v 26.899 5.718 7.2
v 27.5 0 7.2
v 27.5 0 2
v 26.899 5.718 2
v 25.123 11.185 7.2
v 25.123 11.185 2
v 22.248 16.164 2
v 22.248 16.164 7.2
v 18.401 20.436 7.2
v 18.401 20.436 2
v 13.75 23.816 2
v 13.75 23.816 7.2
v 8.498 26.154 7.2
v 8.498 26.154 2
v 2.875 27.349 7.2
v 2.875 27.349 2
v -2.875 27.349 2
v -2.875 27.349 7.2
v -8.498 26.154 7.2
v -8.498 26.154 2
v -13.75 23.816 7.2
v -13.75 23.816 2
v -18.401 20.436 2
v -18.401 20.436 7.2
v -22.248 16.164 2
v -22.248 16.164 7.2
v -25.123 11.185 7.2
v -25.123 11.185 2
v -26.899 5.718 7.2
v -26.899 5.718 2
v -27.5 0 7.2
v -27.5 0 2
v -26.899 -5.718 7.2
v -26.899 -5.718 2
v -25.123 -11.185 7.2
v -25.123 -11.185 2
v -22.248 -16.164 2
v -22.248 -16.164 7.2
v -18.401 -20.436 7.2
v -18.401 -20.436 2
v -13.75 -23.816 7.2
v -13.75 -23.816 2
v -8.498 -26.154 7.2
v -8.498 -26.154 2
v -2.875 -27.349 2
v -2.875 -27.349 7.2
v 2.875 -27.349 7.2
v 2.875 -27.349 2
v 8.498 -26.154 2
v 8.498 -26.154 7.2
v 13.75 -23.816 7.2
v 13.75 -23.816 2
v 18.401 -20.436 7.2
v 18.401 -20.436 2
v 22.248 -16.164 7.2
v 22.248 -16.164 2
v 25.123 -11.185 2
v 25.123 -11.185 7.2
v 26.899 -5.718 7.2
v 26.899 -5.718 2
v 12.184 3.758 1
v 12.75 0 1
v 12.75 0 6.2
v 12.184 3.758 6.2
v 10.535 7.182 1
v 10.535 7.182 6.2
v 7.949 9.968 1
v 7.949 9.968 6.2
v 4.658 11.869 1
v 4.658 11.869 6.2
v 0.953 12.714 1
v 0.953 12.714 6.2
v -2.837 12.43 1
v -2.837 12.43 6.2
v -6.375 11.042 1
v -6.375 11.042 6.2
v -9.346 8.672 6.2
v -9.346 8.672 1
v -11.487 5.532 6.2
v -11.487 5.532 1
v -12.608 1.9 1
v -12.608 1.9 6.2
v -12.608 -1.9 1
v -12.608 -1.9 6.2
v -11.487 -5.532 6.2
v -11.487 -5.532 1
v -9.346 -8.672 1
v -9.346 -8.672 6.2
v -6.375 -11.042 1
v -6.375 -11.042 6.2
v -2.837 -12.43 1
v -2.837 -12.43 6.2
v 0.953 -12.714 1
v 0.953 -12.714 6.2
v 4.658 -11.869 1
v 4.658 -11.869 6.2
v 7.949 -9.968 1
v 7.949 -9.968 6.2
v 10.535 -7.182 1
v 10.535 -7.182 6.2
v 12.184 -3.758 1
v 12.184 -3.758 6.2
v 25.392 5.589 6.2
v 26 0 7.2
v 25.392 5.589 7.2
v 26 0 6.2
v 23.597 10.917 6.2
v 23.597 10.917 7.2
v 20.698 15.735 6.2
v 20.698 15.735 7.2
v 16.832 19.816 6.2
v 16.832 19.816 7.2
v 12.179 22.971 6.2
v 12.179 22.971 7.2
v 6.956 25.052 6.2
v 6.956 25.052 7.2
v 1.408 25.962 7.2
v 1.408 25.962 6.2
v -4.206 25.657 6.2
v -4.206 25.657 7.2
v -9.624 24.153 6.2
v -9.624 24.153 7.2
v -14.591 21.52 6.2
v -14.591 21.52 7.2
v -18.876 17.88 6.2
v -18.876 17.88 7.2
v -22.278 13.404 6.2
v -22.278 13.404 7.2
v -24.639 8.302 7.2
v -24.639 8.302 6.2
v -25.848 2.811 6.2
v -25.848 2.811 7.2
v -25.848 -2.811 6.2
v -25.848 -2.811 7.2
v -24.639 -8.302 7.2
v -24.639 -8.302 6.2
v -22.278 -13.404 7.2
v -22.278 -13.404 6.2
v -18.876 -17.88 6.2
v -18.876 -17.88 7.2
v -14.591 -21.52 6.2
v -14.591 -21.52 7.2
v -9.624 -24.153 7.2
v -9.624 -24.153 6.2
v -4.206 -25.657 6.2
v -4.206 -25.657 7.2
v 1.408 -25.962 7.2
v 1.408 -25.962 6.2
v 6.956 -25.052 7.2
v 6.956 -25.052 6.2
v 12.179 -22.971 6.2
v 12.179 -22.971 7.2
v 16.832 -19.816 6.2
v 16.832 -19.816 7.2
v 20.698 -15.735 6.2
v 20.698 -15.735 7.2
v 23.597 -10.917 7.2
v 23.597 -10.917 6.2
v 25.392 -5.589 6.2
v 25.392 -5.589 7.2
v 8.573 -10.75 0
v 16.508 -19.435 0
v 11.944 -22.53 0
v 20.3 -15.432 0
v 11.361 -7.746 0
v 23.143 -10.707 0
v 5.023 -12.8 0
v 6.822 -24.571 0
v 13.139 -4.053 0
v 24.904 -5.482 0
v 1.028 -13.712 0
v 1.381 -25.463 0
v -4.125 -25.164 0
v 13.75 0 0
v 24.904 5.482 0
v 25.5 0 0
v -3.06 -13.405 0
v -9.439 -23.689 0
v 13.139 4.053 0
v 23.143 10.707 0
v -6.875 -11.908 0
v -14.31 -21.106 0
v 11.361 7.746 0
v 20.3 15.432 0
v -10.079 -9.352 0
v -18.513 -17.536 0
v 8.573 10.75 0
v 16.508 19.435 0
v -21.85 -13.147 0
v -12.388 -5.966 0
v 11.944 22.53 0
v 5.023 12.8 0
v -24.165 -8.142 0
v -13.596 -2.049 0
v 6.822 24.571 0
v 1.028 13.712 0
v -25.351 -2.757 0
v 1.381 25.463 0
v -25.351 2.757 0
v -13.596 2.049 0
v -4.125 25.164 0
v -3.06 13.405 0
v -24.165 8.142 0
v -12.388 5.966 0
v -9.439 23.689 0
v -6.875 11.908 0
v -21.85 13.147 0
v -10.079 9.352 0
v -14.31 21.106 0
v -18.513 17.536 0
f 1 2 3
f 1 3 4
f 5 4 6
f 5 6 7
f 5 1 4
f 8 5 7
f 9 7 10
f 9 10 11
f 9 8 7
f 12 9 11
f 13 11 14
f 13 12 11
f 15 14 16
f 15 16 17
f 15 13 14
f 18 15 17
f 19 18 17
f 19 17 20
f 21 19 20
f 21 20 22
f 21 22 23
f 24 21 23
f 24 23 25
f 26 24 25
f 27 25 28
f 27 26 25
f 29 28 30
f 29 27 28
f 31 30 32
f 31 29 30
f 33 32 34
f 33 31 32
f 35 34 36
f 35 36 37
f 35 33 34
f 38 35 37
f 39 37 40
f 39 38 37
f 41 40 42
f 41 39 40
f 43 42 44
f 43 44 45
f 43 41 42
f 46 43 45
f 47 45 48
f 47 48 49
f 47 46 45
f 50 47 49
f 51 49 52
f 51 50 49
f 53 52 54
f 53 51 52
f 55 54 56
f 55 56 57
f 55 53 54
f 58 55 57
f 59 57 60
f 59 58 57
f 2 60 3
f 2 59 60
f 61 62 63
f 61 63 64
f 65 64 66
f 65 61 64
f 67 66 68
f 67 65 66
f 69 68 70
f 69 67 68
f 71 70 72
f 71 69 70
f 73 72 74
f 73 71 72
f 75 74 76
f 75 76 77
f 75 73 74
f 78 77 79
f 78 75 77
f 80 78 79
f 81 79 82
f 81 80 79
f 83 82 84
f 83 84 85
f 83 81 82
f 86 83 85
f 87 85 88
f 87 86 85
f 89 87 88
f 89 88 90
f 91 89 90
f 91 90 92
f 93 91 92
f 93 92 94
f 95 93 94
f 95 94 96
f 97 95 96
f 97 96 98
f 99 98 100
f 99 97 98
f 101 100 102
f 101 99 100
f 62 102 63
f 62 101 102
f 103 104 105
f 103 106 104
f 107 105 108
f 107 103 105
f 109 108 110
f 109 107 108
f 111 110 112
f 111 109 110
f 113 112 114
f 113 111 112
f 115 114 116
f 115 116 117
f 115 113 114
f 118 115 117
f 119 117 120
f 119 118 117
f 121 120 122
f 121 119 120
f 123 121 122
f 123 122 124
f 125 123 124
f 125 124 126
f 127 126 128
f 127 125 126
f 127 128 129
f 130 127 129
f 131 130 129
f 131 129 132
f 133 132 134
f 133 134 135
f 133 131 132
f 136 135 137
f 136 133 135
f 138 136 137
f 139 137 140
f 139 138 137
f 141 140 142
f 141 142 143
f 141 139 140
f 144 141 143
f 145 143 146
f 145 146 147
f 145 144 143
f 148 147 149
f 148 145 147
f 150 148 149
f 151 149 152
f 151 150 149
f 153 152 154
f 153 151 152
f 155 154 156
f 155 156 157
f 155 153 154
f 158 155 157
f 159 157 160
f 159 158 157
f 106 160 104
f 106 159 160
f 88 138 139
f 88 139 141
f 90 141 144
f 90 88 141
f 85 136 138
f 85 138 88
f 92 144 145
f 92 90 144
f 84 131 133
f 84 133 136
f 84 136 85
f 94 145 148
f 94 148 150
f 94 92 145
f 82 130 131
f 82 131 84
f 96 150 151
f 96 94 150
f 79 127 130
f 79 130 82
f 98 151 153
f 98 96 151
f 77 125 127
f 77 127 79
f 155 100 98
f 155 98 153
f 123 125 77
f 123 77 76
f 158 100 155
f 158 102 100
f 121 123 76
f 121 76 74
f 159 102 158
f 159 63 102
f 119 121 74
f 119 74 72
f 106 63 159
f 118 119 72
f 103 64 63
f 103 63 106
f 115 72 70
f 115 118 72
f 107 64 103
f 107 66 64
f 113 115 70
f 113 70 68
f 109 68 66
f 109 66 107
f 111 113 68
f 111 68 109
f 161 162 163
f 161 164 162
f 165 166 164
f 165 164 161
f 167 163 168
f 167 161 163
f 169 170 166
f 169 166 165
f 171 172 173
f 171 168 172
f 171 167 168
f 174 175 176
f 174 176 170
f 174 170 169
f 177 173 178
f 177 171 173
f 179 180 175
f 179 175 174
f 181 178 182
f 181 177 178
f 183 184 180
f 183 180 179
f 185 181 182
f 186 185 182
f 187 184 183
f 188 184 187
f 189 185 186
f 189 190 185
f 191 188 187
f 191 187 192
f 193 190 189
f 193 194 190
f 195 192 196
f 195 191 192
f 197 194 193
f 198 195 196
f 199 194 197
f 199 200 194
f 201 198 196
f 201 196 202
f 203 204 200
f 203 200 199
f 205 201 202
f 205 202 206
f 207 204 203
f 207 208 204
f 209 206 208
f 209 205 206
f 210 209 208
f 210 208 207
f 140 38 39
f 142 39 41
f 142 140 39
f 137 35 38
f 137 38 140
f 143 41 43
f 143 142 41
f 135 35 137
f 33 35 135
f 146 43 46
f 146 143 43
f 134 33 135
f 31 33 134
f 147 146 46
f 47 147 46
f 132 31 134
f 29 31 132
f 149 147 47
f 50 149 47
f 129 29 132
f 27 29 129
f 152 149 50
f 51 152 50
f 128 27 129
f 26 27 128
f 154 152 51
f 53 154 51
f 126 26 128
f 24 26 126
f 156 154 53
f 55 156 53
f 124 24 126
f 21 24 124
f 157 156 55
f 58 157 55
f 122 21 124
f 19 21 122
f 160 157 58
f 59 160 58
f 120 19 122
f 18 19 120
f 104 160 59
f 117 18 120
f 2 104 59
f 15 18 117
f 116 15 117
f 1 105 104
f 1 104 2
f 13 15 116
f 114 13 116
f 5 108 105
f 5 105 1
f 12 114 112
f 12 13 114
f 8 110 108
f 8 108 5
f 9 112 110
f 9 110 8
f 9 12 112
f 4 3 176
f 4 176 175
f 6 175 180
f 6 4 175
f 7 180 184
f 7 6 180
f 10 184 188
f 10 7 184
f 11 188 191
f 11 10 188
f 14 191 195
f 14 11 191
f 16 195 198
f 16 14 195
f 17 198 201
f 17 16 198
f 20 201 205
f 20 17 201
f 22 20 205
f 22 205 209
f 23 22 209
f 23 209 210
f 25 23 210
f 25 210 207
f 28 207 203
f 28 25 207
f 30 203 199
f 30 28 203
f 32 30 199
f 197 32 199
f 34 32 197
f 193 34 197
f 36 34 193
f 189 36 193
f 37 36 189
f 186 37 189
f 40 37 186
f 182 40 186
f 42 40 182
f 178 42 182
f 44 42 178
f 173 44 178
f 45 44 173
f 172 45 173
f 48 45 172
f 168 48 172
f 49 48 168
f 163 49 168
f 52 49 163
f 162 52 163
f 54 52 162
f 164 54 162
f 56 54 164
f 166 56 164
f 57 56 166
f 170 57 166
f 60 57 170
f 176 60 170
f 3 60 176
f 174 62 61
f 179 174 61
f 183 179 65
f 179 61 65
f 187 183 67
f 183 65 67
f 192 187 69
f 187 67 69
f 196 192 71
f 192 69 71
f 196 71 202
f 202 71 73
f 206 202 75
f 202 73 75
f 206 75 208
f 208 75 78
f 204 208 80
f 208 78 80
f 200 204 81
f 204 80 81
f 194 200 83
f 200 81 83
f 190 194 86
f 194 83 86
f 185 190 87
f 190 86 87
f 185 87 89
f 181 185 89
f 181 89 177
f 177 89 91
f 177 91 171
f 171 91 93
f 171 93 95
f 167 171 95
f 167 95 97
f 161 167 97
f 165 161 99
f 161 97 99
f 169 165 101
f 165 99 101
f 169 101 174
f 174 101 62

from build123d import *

# Parameters (mm, degrees)
F2_SIZE = 2
F3_SIZE = 1


with BuildPart() as f1:
    # F0 (on Front) → F1 (revolve)
    with BuildSketch(Plane.XZ):
        Polygon((12.75, 6.2), (12.75, 0), (27.5, 0), (27.5, 7.2), (26, 7.2), (26, 6.2), align=None)
    revolve(axis=Axis((0, 0, 15.391572), (0, 0, 1)))

    # F2
    f2_edges = [f1.edges().sort_by_distance(p)[0] for p in [
        (-27.5, 0, 0),
    ]]
    chamfer(f2_edges, length=F2_SIZE)

    # F3
    f3_edges = [f1.edges().sort_by_distance(p)[0] for p in [
        (-12.75, 0, 0),
    ]]
    chamfer(f3_edges, length=F3_SIZE)


solid = f1.part
